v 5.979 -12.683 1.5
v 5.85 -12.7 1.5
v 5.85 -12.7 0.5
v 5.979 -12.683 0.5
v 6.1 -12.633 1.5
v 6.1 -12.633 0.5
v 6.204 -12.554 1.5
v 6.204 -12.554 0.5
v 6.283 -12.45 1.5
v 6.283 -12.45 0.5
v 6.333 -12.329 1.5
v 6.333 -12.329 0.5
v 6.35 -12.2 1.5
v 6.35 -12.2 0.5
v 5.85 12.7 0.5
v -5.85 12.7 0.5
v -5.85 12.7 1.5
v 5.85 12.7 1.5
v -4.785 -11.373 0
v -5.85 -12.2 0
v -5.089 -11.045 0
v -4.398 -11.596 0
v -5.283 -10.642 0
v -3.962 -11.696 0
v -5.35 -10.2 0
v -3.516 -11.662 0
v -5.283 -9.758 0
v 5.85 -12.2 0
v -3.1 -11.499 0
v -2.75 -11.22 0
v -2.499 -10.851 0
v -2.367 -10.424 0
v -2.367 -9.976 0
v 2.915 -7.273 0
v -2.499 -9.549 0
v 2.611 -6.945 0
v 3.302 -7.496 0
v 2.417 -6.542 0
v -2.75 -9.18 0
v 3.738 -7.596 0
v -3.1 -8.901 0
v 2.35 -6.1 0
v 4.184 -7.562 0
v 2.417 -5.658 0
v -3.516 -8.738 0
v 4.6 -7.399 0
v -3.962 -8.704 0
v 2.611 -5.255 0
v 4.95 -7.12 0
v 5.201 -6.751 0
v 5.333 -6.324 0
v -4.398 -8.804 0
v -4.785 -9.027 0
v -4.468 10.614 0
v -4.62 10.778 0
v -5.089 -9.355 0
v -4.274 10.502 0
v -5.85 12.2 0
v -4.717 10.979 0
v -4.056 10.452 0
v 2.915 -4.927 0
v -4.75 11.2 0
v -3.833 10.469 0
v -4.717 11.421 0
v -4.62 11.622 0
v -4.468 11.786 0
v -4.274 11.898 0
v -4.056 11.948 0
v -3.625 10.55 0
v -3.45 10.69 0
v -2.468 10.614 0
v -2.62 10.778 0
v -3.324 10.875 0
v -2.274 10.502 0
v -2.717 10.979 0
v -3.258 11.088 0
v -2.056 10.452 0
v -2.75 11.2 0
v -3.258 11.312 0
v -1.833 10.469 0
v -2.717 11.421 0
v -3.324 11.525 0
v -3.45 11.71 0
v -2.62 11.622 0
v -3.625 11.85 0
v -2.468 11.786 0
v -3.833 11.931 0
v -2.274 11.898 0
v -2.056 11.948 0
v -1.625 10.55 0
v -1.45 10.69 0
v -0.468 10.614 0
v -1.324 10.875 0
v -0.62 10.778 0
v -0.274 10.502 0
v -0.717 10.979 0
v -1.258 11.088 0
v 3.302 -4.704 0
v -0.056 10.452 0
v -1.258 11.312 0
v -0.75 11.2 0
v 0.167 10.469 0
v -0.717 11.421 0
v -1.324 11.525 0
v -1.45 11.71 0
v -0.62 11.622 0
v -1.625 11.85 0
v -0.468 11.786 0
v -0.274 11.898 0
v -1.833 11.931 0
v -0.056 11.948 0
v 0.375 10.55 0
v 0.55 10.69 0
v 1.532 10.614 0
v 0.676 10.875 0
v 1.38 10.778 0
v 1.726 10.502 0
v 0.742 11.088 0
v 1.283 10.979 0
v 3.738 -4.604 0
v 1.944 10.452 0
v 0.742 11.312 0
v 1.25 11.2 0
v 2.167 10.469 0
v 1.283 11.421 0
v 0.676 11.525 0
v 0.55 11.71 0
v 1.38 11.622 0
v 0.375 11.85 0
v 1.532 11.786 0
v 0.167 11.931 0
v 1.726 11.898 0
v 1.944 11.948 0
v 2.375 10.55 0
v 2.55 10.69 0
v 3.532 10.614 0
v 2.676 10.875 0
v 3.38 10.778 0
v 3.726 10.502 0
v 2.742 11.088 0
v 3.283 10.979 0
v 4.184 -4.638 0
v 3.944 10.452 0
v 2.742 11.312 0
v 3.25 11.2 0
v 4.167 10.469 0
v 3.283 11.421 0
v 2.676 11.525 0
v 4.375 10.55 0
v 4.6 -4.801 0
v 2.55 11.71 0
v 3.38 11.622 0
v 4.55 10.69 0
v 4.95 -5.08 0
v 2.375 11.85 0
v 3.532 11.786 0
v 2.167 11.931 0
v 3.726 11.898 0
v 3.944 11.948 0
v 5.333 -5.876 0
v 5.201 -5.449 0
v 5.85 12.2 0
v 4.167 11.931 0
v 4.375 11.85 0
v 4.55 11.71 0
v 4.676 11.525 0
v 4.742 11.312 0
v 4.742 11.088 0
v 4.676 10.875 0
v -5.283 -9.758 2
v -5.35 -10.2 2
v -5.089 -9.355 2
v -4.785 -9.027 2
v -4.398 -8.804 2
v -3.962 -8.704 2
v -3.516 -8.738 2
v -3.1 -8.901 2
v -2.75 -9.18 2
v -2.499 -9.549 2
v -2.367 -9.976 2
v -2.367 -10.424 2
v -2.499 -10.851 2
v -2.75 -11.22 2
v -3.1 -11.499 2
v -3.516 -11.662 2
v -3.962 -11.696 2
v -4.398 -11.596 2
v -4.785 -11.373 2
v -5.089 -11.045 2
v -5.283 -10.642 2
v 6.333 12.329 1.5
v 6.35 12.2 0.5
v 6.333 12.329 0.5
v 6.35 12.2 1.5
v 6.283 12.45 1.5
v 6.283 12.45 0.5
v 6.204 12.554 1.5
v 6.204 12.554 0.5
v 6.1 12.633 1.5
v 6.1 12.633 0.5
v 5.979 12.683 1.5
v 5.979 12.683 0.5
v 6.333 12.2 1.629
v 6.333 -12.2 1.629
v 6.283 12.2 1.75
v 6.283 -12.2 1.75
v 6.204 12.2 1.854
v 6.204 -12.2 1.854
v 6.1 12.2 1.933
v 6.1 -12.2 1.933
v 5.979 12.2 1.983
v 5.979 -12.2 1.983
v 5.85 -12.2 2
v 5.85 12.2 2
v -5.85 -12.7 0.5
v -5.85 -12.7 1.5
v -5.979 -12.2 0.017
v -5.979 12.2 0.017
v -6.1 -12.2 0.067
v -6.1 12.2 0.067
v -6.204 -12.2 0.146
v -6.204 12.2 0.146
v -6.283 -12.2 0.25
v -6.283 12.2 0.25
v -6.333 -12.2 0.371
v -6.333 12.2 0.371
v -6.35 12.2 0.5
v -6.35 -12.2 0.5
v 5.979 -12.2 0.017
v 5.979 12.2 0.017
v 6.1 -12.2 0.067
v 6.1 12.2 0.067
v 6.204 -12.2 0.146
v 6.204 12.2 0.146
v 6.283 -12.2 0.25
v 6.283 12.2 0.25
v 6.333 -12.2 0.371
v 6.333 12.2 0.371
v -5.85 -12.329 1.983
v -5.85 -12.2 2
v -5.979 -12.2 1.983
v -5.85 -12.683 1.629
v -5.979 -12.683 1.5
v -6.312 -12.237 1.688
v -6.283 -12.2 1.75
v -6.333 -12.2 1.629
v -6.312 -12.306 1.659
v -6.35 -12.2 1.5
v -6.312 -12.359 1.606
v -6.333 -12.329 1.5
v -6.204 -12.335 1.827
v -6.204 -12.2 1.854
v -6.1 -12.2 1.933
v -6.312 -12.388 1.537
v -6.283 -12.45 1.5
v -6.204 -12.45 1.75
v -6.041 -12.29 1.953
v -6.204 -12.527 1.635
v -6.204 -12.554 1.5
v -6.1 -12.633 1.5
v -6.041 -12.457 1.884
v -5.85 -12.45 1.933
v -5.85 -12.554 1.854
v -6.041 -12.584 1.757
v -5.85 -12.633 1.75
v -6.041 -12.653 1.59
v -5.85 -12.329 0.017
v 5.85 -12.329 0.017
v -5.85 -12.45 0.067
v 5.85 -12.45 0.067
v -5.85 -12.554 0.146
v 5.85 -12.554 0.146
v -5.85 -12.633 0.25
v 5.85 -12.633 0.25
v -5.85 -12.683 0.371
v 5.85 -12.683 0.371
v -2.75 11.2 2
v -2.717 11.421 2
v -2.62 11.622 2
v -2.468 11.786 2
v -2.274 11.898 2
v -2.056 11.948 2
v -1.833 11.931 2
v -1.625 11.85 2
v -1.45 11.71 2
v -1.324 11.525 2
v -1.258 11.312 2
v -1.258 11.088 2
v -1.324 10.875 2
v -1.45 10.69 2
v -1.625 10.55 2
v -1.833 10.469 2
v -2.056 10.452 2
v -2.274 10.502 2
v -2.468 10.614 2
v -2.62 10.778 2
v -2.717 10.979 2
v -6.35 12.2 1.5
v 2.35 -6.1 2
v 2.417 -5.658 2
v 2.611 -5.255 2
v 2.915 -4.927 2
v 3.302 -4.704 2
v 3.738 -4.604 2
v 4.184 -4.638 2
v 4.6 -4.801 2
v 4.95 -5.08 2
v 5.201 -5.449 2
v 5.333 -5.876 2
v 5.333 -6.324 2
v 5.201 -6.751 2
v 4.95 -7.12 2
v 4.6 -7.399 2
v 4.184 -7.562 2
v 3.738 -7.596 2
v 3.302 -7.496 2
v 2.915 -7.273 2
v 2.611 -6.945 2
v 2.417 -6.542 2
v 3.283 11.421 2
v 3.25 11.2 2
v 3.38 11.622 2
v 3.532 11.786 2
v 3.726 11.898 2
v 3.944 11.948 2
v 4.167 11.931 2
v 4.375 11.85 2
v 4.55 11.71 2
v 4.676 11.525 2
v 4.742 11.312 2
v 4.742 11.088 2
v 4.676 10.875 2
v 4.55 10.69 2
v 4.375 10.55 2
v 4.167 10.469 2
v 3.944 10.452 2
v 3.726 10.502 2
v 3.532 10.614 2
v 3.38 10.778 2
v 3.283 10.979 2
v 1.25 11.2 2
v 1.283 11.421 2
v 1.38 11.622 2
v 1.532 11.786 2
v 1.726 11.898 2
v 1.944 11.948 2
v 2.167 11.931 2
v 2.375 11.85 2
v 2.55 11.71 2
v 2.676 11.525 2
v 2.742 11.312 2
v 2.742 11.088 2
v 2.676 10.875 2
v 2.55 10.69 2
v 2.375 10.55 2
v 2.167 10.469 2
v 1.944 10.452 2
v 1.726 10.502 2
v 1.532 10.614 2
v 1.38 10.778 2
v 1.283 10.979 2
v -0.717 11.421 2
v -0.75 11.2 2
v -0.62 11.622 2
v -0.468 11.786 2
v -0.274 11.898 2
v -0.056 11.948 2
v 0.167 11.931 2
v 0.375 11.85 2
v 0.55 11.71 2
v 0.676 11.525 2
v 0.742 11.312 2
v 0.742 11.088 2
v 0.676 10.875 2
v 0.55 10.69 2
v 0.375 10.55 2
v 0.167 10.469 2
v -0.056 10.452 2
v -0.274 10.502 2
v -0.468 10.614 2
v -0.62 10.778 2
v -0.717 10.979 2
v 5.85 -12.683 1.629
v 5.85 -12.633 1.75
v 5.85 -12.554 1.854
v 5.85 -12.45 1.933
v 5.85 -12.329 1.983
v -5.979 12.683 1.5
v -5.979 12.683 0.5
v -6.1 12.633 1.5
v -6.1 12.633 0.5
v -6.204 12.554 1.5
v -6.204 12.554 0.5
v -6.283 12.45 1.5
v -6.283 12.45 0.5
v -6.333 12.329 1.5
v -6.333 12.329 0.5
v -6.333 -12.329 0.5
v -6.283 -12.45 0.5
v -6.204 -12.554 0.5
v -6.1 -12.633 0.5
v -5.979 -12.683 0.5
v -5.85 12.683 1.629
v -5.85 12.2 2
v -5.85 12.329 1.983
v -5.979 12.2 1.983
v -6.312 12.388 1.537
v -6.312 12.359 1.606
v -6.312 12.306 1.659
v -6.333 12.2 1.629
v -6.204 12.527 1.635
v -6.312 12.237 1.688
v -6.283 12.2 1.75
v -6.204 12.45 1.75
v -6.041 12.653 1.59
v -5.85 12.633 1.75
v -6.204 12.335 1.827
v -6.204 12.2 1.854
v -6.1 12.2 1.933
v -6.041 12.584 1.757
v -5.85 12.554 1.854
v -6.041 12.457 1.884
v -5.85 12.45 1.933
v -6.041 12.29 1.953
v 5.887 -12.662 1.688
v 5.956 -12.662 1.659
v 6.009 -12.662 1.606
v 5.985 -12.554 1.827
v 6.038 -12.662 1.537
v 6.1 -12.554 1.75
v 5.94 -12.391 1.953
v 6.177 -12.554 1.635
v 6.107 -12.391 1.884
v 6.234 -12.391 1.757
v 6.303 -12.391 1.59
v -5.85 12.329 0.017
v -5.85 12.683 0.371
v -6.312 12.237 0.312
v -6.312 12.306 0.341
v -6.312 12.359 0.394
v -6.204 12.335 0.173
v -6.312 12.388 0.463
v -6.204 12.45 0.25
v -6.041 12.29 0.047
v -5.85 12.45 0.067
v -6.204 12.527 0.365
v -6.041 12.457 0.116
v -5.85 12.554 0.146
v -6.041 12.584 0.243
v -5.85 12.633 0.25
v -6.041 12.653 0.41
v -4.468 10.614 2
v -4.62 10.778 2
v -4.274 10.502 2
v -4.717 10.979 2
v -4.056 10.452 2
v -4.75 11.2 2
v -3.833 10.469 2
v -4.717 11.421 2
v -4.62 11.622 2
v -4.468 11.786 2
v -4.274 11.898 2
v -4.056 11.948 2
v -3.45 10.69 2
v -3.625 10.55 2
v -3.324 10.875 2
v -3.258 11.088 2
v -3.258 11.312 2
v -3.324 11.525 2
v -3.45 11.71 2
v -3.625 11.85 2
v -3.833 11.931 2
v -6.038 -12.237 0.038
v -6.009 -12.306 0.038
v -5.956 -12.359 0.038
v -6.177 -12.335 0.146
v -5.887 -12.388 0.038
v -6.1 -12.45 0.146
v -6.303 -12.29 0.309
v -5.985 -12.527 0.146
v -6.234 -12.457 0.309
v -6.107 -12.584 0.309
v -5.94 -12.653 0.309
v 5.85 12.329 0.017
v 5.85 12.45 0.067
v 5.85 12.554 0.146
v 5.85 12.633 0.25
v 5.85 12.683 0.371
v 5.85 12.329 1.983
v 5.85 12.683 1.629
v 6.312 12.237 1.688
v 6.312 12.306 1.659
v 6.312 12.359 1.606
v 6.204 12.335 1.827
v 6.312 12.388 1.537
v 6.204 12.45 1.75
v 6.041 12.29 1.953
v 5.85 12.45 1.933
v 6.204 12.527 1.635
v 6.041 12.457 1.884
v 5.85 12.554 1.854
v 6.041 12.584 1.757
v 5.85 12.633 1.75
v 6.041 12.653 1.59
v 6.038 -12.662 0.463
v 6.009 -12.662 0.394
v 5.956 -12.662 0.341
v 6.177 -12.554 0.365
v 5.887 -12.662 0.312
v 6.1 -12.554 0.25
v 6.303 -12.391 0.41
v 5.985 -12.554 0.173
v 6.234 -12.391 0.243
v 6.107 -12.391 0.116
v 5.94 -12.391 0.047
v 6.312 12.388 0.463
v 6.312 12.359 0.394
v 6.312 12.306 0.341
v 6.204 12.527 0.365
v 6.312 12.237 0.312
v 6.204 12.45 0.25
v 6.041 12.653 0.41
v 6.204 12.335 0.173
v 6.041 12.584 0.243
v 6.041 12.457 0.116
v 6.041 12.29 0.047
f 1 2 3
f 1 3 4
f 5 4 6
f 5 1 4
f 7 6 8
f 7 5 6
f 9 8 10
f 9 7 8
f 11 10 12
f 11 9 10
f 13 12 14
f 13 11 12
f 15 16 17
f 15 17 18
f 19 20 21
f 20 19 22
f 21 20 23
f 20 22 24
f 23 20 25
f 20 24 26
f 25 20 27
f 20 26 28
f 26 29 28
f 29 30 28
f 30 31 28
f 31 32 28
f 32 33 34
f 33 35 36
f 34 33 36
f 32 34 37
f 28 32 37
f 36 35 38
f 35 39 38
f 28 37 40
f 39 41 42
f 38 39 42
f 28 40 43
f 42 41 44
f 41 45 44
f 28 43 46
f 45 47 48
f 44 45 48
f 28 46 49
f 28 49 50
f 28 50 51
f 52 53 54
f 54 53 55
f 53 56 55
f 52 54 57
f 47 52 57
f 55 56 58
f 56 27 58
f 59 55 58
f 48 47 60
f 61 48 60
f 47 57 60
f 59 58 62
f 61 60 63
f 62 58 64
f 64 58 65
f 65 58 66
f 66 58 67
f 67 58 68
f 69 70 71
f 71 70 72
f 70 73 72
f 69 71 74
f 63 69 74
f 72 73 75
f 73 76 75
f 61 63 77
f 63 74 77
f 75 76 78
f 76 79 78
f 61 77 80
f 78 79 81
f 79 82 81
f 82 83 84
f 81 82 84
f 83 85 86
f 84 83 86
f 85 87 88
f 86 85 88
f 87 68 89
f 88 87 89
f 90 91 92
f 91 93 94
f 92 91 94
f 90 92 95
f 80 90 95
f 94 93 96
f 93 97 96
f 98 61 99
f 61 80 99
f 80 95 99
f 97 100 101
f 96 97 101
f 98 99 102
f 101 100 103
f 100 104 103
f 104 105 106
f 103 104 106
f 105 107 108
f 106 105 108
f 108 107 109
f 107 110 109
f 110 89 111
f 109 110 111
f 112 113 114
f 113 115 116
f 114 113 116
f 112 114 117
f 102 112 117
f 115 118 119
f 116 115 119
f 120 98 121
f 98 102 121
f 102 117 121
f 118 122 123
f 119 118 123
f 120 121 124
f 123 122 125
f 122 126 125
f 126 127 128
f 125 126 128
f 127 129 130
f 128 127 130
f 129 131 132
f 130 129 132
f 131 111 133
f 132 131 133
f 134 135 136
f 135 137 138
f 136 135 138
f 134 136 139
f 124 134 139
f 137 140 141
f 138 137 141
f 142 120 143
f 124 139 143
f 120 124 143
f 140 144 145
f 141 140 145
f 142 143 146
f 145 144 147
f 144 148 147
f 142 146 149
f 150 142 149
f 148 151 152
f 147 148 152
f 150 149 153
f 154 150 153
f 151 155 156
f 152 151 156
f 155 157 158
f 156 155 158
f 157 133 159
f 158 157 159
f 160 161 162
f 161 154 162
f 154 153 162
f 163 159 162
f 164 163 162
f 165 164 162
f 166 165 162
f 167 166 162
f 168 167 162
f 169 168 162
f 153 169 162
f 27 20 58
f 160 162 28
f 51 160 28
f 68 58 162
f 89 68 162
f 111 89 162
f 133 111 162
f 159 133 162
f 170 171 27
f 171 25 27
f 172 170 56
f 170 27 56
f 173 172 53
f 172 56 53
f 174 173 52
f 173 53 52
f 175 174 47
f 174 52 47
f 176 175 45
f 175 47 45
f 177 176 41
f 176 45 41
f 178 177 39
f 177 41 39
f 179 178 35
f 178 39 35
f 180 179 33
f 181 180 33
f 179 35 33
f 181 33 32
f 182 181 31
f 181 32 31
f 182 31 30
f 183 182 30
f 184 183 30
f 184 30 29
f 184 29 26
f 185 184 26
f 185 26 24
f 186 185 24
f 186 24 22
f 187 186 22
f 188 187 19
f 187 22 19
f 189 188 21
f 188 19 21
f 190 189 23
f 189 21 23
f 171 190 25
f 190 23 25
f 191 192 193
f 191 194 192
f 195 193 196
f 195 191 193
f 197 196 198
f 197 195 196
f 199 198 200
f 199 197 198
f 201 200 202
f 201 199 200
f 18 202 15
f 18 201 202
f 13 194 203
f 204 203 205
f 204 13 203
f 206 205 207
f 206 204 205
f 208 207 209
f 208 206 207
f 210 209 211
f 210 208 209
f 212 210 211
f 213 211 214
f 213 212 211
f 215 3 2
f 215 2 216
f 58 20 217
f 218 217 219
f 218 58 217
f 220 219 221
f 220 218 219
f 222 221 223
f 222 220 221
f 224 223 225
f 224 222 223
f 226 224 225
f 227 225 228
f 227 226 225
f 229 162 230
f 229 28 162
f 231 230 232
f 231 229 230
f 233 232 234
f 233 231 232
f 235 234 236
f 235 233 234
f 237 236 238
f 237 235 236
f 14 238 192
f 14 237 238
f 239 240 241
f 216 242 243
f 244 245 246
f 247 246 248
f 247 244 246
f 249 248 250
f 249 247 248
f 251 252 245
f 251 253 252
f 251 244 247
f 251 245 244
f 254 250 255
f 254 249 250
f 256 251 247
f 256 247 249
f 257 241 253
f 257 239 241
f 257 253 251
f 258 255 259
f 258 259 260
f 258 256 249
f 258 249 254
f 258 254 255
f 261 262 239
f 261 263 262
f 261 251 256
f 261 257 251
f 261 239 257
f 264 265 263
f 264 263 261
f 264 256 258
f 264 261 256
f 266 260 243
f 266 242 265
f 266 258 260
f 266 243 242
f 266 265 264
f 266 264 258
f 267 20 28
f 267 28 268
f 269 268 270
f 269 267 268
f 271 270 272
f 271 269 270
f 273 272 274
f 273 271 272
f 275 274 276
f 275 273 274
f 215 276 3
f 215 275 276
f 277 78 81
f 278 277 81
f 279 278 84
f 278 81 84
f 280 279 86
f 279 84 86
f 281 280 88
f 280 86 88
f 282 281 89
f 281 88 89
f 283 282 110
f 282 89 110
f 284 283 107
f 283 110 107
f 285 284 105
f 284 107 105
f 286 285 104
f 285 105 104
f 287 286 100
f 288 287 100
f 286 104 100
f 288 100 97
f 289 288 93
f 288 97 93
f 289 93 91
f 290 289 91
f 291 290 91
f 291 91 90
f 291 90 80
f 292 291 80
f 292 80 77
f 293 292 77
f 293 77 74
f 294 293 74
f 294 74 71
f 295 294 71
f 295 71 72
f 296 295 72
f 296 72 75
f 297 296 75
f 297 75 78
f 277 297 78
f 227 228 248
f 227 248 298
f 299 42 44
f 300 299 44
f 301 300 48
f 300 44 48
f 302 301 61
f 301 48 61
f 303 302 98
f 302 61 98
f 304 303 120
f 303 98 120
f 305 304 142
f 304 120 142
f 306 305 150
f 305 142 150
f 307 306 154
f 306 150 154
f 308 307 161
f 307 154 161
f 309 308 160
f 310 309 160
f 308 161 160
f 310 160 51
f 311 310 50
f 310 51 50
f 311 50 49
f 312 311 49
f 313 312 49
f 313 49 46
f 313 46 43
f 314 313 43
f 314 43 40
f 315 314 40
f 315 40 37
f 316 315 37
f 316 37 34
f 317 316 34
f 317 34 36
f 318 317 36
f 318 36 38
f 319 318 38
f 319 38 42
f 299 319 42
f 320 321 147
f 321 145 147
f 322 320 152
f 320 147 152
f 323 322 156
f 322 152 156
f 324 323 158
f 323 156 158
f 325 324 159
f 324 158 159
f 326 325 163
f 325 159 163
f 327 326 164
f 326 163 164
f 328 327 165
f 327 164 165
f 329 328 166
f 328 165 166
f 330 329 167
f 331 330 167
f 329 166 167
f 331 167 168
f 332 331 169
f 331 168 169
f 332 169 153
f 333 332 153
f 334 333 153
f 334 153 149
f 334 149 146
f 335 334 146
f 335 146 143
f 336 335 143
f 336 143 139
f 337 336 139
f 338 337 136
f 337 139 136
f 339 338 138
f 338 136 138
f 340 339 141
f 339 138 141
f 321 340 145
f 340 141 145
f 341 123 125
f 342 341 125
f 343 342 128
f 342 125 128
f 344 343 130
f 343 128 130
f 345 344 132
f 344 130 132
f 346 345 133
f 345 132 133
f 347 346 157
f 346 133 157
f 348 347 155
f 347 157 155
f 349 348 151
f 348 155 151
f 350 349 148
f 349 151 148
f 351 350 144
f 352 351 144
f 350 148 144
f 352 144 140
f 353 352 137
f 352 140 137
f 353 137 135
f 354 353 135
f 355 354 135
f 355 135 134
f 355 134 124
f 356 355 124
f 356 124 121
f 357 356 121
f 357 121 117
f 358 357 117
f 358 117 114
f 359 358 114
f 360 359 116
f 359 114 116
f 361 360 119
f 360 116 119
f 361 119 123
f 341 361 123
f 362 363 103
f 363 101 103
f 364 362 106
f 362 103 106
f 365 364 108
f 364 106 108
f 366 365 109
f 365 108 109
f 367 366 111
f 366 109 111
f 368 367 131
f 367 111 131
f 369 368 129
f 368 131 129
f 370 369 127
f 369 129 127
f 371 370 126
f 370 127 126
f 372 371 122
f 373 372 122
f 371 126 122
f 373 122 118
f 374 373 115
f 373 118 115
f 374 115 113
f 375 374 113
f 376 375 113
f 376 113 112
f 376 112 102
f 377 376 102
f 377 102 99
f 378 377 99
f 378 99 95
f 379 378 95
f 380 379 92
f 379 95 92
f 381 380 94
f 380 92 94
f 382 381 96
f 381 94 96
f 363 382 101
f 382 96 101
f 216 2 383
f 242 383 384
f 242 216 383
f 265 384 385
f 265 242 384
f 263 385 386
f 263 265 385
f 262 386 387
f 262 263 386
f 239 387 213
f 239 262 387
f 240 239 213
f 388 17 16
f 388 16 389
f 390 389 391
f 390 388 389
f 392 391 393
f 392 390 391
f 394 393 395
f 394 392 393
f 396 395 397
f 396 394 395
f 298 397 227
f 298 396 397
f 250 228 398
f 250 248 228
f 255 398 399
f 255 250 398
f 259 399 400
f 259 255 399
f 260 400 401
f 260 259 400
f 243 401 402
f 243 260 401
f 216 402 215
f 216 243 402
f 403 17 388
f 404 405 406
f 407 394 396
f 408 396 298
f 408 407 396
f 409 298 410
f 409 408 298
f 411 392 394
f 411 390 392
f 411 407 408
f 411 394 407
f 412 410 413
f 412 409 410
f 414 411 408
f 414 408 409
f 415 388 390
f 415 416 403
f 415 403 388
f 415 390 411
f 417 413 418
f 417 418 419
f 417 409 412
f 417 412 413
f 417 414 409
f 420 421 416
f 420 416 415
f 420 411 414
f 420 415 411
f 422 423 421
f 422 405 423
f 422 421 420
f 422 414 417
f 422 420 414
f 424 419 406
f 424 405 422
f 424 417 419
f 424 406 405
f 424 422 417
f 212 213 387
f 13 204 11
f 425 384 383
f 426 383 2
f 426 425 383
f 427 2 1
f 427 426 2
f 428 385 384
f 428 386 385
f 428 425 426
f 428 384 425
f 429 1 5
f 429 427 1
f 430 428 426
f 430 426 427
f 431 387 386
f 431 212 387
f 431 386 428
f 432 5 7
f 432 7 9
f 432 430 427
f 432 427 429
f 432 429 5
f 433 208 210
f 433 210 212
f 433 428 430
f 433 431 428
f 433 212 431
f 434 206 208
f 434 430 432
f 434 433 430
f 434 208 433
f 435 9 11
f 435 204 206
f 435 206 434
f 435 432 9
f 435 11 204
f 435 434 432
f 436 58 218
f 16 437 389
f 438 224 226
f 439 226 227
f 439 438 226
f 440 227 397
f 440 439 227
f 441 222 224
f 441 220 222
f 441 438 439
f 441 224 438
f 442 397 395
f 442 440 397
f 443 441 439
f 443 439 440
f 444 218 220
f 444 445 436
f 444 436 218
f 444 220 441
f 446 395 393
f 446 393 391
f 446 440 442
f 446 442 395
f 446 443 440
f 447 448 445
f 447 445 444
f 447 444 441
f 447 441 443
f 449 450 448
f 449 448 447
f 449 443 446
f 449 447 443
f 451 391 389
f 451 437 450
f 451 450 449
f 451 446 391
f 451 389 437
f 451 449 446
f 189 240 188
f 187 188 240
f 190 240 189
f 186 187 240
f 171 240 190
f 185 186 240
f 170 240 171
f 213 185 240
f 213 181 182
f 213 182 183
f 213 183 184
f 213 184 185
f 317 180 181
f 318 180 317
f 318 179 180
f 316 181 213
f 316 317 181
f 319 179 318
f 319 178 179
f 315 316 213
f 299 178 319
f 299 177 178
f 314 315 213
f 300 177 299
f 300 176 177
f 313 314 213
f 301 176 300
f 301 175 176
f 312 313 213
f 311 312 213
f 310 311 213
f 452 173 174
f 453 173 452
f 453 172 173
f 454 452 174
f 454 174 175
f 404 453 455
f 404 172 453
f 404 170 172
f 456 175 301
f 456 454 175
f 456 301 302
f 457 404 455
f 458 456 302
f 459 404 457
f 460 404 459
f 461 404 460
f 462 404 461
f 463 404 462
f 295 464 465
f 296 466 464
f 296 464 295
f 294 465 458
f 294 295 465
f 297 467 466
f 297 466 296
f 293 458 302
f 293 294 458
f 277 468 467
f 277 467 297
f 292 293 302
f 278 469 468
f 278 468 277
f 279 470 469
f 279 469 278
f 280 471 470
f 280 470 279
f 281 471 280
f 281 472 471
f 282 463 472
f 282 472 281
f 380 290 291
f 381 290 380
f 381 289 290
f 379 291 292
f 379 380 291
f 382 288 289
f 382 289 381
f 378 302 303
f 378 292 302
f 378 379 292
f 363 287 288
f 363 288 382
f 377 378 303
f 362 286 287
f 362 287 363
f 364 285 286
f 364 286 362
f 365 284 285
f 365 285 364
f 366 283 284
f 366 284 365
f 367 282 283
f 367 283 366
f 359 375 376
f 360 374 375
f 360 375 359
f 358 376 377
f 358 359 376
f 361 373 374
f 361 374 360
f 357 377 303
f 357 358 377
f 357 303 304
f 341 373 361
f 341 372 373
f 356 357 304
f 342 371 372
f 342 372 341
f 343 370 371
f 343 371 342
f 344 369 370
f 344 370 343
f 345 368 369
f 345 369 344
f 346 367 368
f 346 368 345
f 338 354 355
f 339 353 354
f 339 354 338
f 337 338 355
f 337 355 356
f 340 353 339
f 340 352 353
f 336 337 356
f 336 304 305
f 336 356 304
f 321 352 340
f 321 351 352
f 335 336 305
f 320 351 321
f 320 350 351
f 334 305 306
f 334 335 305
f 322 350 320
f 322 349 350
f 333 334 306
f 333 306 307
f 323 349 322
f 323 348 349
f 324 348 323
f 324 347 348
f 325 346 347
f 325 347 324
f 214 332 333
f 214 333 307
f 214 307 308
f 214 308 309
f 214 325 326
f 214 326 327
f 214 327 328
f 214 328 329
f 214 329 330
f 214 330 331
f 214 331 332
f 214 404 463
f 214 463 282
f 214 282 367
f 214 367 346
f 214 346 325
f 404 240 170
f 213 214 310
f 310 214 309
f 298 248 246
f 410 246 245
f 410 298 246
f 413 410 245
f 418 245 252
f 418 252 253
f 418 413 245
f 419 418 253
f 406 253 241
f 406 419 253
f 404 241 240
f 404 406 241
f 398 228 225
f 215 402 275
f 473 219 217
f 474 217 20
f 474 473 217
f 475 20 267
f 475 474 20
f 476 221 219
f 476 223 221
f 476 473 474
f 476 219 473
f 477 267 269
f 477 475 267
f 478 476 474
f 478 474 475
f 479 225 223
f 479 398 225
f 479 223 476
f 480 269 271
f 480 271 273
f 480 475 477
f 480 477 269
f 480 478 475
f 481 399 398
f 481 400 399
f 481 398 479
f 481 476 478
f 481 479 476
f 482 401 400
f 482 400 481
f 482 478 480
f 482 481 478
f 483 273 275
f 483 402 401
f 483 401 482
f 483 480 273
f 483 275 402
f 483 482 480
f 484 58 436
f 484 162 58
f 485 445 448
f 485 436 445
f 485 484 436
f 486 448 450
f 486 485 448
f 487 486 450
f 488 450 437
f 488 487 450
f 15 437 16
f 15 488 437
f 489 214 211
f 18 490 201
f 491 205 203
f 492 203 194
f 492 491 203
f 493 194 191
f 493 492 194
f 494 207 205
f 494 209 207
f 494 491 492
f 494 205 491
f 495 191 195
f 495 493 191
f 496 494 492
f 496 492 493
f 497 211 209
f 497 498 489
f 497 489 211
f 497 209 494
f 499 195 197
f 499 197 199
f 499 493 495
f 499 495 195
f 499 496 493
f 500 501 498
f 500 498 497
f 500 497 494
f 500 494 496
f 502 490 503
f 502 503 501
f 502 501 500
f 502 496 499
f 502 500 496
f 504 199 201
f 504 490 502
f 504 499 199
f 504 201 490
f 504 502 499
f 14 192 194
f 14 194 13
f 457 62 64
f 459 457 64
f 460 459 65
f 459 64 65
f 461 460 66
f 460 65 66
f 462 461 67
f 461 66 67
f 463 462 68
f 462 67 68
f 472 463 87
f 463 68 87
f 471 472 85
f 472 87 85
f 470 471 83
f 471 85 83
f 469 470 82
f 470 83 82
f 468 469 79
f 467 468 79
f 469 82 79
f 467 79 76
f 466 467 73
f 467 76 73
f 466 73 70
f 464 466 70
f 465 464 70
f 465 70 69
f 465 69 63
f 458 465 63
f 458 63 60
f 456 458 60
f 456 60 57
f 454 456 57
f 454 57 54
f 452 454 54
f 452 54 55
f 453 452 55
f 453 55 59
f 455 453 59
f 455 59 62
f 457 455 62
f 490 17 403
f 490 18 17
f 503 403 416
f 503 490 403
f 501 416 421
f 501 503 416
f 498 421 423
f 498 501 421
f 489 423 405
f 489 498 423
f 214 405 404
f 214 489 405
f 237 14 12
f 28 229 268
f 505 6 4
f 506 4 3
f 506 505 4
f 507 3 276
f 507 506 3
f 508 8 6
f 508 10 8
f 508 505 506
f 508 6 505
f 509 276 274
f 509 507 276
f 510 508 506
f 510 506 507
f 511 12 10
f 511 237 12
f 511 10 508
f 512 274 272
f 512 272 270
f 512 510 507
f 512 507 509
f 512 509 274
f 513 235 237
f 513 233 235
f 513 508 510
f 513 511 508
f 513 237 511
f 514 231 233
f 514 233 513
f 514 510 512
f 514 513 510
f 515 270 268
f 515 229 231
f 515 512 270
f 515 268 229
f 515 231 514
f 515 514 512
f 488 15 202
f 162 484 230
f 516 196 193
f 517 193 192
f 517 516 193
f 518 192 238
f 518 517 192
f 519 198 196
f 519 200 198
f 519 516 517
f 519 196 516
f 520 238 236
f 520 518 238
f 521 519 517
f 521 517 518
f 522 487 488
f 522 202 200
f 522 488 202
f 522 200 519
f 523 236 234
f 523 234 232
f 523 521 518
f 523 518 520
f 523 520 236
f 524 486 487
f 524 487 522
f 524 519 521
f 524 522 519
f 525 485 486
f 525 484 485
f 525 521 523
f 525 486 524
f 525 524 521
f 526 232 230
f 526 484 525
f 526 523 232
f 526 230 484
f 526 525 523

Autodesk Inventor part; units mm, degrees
ref_plane "YZ Plane" through (0, 0, 0) normal (1, 0, 0) x (0, 1, 0)
ref_plane "XZ Plane" through (0, 0, 0) normal (0, 1, 0) x (-1, 0, 0)
ref_plane "XY Plane" through (0, 0, 0) normal (0, 0, 1) x (1, 0, 0)
sketch "Szkic1" plane through (0, 0, 0) normal (0, 0, 1) x (1, 0, 0)
  line L0 (6.35, -12.7) -> (-6.35, -12.7)
  line L1 (-6.35, -12.7) -> (-6.35, 12.7)
  line L2 (-6.35, 12.7) -> (6.35, 12.7)
  line L3 (6.35, 12.7) -> (6.35, -12.7)
  line L4 (6.35, -12.7) -> (-6.35, 12.7) construction
  line L5 (-6.35, -12.7) -> (6.35, 12.7) construction
  point P0 (0, 0)
  dimension "d0" = 12.7
  dimension "d1" = 25.4
extrude "Wyciągnięcie proste1" add sketch "Szkic1" along normal blind 2
fillet "Zaokrąglenie1" radius 0.5 12 edges at (0, 12.7, 2) (0, 12.7, 0) (-6.35, 12.7, 1) (6.35, 12.7, 1) (6.35, 0, 2) (6.35, 0, 0) (6.35, -12.7, 1) (0, -12.7, 2) (-6.35, 0, 2) (-6.35, -12.7, 1) (-6.35, 0, 0) (0, -12.7, 0)
sketch "Szkic2" plane through (0, 0, 0) normal (0, 0, -1) x (-1, 0, 0)
  line L0 (-5.85, -12.2) -> (5.85, -12.2) projected
  line L1 (-5.85, -12.2) -> (-5.85, -6.1)
  line L2 (-5.85, 12.2) -> (-5.85, -12.2) projected
  line L3 (-5.85, -6.1) -> (-3.85, -6.1)
  line L4 (5.85, -12.2) -> (5.85, 12.2) projected
  line L5 (5.85, -12.2) -> (3.85, -12.2)
  line L6 (3.85, -12.2) -> (3.85, -10.2)
  circle A0 centre (-3.85, -6.1) radius 1.5
  circle A1 centre (3.85, -10.2) radius 1.5
  line L7 (5.85, 12.2) -> (-5.85, 12.2) projected
  line L8 (-5.85, 12.2) -> (-5.85, 11.2)
  line L9 (0, 12.2) -> (0, 11.2)
  line L10 (0, 11.2) -> (-2, 11.2)
  line L11 (-2, 11.2) -> (-4, 11.2)
  line L12 (0, 11.2) -> (2, 11.2)
  line L13 (2, 11.2) -> (4, 11.2)
  circle A2 centre (-4, 11.2) radius 0.75
  circle A3 centre (-2, 11.2) radius 0.75
  circle A4 centre (0, 11.2) radius 0.75
  circle A5 centre (2, 11.2) radius 0.75
  circle A6 centre (4, 11.2) radius 0.75
  point P0 (0, 0)
  dimension "d5" = 6.1
  dimension "d8" = 2
  dimension "d9" = 2
  dimension "d10" = 2
  dimension "d11" = 3
  dimension "d12" = 3
  dimension "d13" = 1
  dimension "d14" = 1
  dimension "d15" = 2
  dimension "d16" = 2
  dimension "d17" = 2
  dimension "d18" = 2
  dimension "d19" = 1.5
  dimension "d20" = 1.5
  dimension "d21" = 1.5
  dimension "d22" = 1.5
  dimension "d23" = 1.5
extrude "Wyciągnięcie proste2" cut sketch "Szkic2" against normal blind 2 contours A1 | A6 | A5 L13 L12 | L12 L13 A5 | A2 | A3 L11 L10 | L10 L11 A3 | A4 L12 L9 | L9 L10 A4 | A0 | L12 A4 L10
properties part number "Czujnik AltIMU-10"
